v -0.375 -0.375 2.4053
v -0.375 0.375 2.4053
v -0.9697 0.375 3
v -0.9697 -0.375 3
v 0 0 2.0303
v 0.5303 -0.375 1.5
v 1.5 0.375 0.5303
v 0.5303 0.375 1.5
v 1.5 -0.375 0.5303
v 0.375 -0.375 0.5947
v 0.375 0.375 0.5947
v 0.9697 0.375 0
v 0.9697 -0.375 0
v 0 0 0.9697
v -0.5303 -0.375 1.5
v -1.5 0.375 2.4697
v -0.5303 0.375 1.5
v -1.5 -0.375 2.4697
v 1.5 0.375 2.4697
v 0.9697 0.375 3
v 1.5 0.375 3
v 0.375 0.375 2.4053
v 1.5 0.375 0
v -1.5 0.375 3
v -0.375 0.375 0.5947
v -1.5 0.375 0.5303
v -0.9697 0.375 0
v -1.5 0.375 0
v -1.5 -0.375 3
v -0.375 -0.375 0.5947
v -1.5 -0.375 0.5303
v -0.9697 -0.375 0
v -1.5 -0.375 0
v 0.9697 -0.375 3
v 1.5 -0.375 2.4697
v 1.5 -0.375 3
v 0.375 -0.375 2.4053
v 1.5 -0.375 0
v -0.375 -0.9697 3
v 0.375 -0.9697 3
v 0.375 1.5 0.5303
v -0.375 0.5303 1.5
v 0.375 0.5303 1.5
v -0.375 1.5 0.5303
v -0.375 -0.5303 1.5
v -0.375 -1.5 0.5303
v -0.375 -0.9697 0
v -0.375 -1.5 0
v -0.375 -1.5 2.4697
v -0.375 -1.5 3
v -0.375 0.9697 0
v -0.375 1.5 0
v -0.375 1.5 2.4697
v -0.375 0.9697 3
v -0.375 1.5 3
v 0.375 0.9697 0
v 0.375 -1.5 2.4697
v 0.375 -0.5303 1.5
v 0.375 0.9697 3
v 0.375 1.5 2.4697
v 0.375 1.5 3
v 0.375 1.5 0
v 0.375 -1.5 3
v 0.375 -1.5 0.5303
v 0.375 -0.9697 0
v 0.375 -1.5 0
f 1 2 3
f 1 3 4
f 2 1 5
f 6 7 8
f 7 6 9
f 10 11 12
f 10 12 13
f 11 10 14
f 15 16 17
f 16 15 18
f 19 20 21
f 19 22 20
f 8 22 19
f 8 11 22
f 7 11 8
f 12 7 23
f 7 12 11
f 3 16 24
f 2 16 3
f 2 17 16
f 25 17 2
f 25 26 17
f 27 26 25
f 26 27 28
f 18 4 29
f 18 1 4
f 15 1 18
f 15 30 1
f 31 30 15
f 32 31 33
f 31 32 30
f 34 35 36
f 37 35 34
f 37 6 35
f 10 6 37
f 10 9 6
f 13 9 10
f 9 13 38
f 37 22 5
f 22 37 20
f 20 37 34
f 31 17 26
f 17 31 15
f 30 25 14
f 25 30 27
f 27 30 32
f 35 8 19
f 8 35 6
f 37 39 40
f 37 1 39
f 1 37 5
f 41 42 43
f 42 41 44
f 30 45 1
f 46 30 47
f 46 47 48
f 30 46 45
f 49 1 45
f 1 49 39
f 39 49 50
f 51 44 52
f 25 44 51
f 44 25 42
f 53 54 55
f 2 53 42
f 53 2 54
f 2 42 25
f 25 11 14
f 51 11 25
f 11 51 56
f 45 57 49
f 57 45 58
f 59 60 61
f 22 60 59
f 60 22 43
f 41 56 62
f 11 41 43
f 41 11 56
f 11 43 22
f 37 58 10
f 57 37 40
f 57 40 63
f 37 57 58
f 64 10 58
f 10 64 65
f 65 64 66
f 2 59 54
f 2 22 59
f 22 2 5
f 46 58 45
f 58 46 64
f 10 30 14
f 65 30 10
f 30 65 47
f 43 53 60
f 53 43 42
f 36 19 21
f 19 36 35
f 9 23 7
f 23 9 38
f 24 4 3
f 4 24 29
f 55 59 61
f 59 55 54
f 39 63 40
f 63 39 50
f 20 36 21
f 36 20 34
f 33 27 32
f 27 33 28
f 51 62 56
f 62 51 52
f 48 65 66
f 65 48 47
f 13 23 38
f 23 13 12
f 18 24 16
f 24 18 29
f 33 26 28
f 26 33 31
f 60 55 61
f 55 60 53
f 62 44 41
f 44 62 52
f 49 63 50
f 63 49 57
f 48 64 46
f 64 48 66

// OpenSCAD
// 3D Multiplication for Stacks of Shapes
// Copyright Slashee the Cow
x_thickness = 0.75;

color("Gold")
translate([0,0,1.5])
intersection(){
    cube(3, center=true);
    //translate([-0.5,0.5,2.5])
    union(){
    rotate([0,45,0])
        cube([5,x_thickness,x_thickness], center=true);
    rotate([0,-45,0])
        cube([5,x_thickness,x_thickness], center=true);
     rotate([0,45,90])
        cube([5,x_thickness,x_thickness], center=true);
    rotate([0,-45,90])
        cube([5,x_thickness,x_thickness], center=true);
     }
     
}
